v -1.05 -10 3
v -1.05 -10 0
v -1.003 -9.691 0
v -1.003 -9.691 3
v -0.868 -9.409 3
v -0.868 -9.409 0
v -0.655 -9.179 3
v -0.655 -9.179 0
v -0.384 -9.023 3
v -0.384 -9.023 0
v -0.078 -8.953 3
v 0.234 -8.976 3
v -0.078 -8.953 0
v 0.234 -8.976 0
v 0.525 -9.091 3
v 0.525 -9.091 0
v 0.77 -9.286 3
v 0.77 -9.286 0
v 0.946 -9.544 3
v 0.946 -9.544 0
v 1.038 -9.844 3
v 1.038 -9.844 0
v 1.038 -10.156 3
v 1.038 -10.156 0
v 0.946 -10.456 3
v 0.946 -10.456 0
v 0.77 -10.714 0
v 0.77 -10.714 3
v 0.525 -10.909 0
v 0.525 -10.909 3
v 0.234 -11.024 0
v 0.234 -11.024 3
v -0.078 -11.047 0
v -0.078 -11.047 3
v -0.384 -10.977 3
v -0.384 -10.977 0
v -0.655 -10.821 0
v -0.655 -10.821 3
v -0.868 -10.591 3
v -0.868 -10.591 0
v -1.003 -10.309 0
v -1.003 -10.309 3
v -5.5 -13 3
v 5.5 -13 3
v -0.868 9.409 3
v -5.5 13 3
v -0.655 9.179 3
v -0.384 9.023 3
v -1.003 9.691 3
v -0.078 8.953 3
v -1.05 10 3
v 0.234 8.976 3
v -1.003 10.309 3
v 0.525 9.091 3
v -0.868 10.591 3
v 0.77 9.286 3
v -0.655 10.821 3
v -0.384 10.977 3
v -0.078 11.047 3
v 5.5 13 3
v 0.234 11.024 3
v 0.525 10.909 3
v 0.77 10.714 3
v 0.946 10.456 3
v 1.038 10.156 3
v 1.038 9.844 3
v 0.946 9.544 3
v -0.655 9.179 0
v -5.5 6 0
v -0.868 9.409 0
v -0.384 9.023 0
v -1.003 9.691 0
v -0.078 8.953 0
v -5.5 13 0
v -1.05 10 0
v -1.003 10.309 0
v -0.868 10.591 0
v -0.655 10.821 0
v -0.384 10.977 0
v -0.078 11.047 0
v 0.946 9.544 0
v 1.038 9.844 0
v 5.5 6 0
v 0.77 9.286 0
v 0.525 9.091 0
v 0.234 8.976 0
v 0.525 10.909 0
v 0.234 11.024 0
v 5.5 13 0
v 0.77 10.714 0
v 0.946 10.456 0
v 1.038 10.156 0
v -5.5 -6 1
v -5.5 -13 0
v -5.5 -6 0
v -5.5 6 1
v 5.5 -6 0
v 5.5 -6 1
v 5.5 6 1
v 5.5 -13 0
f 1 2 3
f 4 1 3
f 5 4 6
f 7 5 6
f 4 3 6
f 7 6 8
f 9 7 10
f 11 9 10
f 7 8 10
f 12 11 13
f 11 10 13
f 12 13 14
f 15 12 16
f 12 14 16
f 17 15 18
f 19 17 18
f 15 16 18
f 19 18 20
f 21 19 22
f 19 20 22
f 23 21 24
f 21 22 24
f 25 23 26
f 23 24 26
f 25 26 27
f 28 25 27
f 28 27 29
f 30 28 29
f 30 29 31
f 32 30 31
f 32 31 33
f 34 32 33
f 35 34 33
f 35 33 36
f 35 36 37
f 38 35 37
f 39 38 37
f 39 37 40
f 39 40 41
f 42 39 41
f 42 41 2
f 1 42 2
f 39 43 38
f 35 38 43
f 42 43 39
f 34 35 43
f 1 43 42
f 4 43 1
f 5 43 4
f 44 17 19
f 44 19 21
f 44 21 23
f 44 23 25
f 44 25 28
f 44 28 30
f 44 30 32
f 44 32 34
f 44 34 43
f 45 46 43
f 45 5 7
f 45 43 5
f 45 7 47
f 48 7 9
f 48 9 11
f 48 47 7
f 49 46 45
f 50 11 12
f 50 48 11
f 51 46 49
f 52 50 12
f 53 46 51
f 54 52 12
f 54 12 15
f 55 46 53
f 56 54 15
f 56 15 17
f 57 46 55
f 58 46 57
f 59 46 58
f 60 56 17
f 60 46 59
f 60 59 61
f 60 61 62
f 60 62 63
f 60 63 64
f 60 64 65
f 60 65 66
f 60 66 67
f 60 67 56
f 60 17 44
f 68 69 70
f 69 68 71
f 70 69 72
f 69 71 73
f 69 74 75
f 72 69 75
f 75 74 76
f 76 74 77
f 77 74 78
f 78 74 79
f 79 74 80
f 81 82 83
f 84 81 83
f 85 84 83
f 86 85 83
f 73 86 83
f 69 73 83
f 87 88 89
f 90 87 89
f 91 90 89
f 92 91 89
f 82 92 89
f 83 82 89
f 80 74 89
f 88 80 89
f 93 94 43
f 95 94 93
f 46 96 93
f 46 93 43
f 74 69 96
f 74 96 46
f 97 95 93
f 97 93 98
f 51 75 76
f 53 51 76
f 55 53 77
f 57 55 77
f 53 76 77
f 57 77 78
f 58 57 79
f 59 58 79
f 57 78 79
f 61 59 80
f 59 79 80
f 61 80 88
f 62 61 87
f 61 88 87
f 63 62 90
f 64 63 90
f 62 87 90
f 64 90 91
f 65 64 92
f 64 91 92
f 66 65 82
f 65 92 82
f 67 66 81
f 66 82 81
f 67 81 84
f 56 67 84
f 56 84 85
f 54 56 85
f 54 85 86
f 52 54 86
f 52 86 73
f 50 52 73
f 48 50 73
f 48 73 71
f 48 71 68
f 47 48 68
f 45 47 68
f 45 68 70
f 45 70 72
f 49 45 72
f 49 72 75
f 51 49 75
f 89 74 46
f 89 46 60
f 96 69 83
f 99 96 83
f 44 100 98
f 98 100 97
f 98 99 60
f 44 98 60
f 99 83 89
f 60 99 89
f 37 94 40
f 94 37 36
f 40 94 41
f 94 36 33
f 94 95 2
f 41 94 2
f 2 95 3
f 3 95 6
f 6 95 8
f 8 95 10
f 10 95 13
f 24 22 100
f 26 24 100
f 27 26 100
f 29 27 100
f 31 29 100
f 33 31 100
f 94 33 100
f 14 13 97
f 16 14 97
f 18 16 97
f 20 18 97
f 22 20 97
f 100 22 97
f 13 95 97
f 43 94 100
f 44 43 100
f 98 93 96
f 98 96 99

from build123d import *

# Parameters (mm, degrees)
F0_W     = 11
F0_H     = 26
F1_DEPTH = 3
F2_W     = 11
F2_H     = 12
F3_DEPTH = 1
F5_D     = 2.1


with BuildPart() as f1:
    # F0 (on Top) → F1 (new body)
    with BuildSketch(Plane.XY):
        Rectangle(F0_W, F0_H)
    extrude(amount=F1_DEPTH)

    # F2 (on face) → F3 (cut)
    with BuildSketch(Plane(origin=(0, 0, 0), x_dir=(1, 0, 0), z_dir=(0, 0, -1))):
        Rectangle(F2_W, F2_H)
    extrude(amount=-F3_DEPTH, mode=Mode.SUBTRACT)

    # F5 (through all)
    with Locations(Plane.XY.offset(3)):
        with Locations((0, 10), (0, -10)):
            Hole(F5_D / 2)


solid = f1.part
